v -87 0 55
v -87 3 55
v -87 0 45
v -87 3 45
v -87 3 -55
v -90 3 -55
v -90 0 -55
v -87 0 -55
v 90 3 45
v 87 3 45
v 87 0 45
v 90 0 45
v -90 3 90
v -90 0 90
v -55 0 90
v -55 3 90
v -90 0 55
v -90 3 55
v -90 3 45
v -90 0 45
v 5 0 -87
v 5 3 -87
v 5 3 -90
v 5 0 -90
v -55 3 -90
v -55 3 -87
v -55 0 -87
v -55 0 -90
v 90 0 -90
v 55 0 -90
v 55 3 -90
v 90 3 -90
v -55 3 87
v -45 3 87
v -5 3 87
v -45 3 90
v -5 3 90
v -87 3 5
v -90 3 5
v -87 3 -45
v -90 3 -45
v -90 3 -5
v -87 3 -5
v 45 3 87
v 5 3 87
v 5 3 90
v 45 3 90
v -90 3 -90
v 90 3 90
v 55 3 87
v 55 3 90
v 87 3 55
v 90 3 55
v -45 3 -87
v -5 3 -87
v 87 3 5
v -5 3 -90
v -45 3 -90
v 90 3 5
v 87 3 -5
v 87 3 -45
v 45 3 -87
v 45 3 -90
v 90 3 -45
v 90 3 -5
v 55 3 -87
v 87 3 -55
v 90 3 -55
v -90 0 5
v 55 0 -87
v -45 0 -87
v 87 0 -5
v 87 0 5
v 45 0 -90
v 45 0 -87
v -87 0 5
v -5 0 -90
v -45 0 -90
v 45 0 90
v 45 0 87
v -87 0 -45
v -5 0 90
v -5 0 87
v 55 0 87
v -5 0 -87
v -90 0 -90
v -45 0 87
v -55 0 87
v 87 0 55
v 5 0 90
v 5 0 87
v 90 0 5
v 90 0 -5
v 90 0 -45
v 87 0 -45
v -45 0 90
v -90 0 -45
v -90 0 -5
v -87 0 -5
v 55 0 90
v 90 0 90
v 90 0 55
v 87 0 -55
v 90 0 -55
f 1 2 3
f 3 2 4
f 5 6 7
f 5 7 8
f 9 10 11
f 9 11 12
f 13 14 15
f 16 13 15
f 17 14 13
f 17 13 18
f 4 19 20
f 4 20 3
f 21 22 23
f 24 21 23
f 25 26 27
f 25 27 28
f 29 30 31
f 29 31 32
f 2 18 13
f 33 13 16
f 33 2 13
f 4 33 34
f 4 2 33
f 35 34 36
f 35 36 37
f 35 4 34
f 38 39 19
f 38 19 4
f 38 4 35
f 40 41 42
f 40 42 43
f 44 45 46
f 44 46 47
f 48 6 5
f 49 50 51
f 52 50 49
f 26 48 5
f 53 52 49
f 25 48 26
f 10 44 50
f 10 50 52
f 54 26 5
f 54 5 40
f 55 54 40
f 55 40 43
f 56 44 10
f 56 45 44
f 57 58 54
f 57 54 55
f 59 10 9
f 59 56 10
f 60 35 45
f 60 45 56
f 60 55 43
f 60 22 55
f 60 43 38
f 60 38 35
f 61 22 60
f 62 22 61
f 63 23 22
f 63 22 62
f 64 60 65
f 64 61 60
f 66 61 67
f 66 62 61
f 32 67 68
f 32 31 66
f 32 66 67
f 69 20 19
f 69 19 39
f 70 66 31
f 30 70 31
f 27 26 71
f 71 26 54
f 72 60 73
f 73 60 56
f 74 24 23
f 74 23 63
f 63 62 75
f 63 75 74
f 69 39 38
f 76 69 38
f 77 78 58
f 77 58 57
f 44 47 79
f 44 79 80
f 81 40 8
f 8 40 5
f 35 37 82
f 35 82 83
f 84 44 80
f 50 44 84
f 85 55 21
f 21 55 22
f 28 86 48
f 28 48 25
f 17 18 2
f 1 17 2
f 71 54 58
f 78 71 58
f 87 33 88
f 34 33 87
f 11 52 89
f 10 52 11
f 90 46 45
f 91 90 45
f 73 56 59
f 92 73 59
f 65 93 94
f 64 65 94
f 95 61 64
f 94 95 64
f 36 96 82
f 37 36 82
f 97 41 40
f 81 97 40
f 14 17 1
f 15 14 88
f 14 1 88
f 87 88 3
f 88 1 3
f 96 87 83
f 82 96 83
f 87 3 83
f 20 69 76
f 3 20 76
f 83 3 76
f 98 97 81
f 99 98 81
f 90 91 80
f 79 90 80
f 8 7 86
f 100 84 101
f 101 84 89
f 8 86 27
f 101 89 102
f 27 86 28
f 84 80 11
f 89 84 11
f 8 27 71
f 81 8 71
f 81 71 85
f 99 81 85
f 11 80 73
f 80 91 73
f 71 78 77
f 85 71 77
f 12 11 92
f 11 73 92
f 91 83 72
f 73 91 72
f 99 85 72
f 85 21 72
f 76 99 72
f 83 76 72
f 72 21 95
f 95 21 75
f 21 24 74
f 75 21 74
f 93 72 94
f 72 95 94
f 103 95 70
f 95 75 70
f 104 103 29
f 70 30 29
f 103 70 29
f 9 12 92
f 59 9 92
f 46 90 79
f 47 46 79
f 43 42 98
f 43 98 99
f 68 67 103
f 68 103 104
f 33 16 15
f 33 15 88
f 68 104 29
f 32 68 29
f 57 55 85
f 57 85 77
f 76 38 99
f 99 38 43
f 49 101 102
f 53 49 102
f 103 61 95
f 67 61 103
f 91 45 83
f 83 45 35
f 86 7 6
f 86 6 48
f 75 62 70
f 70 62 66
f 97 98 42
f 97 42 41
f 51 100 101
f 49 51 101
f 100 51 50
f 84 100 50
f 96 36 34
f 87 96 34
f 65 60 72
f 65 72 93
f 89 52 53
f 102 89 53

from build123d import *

# Parameters (mm, degrees)
SKETCH1_W           = 180
SKETCH1_H           = 180
BOSS_EXTRUDE1_DEPTH = 3
SKETCH2_W           = 5
SKETCH2_H           = 3
CUT_EXTRUDE1_DEPTH  = 3
SKETCH4_W           = 5
SKETCH4_H           = 3
CUT_EXTRUDE2_DEPTH  = 3
SKETCH5_W           = 3
SKETCH5_H           = 5
CUT_EXTRUDE3_DEPTH  = 3
SKETCH6_W           = 3
SKETCH6_H           = 5
CUT_EXTRUDE4_DEPTH  = 3
SKETCH7_W           = 10
SKETCH7_H           = 3
SKETCH7_W_2         = 3
SKETCH7_H_2         = 10
CUT_EXTRUDE5_DEPTH  = 10


with BuildPart() as part:
    # Sketch1 → Boss-Extrude1 (new body)
    with BuildSketch(Plane(origin=(0, 0, 0), x_dir=(1, 0, 0), z_dir=(0, 1, 0))):
        Rectangle(SKETCH1_W, SKETCH1_H)
    extrude(amount=BOSS_EXTRUDE1_DEPTH)

    # Sketch2 → Cut-Extrude1 (cut)
    with BuildSketch(Plane(origin=(0, 3, 0), x_dir=(1, 0, 0), z_dir=(0, 1, 0))):
        with Locations((-2.5, 88.5)):
            Rectangle(SKETCH2_W, SKETCH2_H)
        with Locations((2.5, 88.5)):
            Rectangle(SKETCH2_W, SKETCH2_H)
    extrude(amount=-CUT_EXTRUDE1_DEPTH, mode=Mode.SUBTRACT)

    # Sketch4 → Cut-Extrude2 (cut)
    with BuildSketch(Plane(origin=(0, 3, 0), x_dir=(1, 0, 0), z_dir=(0, 1, 0))):
        with Locations((-2.5, -88.5)):
            Rectangle(SKETCH4_W, SKETCH4_H)
        with Locations((2.5, -88.5)):
            Rectangle(SKETCH4_W, SKETCH4_H)
    extrude(amount=-CUT_EXTRUDE2_DEPTH, mode=Mode.SUBTRACT)

    # Sketch5 → Cut-Extrude3 (cut)
    with BuildSketch(Plane(origin=(0, 3, 0), x_dir=(1, 0, 0), z_dir=(0, 1, 0))):
        with Locations((-88.5, 2.5)):
            Rectangle(SKETCH5_W, SKETCH5_H)
        with Locations((-88.5, -2.5)):
            Rectangle(SKETCH5_W, SKETCH5_H)
    extrude(amount=-CUT_EXTRUDE3_DEPTH, mode=Mode.SUBTRACT)

    # Sketch6 → Cut-Extrude4 (cut)
    with BuildSketch(Plane(origin=(0, 3, 0), x_dir=(1, 0, 0), z_dir=(0, 1, 0))):
        with Locations((88.5, 2.5)):
            Rectangle(SKETCH6_W, SKETCH6_H)
        with Locations((88.5, -2.5)):
            Rectangle(SKETCH6_W, SKETCH6_H)
    extrude(amount=-CUT_EXTRUDE4_DEPTH, mode=Mode.SUBTRACT)

    # Sketch7 → Cut-Extrude5 (cut)
    with BuildSketch(Plane(origin=(0, 3, 0), x_dir=(1, 0, 0), z_dir=(0, 1, 0))):
        with Locations((-50, -88.5)):
            Rectangle(SKETCH7_W, SKETCH7_H)
        with Locations((50, -88.5)):
            Rectangle(SKETCH7_W, SKETCH7_H)
        with Locations((88.5, -50)):
            Rectangle(SKETCH7_W_2, SKETCH7_H_2)
        with Locations((50, 88.5)):
            Rectangle(SKETCH7_W, SKETCH7_H)
        with Locations((-88.5, -50)):
            Rectangle(SKETCH7_W_2, SKETCH7_H_2)
        with Locations((88.5, 50)):
            Rectangle(SKETCH7_W_2, SKETCH7_H_2)
        with Locations((-88.5, 50)):
            Rectangle(SKETCH7_W_2, SKETCH7_H_2)
        with Locations((-50, 88.5)):
            Rectangle(SKETCH7_W, SKETCH7_H)
    extrude(amount=-CUT_EXTRUDE5_DEPTH, mode=Mode.SUBTRACT)


solid = part.part
